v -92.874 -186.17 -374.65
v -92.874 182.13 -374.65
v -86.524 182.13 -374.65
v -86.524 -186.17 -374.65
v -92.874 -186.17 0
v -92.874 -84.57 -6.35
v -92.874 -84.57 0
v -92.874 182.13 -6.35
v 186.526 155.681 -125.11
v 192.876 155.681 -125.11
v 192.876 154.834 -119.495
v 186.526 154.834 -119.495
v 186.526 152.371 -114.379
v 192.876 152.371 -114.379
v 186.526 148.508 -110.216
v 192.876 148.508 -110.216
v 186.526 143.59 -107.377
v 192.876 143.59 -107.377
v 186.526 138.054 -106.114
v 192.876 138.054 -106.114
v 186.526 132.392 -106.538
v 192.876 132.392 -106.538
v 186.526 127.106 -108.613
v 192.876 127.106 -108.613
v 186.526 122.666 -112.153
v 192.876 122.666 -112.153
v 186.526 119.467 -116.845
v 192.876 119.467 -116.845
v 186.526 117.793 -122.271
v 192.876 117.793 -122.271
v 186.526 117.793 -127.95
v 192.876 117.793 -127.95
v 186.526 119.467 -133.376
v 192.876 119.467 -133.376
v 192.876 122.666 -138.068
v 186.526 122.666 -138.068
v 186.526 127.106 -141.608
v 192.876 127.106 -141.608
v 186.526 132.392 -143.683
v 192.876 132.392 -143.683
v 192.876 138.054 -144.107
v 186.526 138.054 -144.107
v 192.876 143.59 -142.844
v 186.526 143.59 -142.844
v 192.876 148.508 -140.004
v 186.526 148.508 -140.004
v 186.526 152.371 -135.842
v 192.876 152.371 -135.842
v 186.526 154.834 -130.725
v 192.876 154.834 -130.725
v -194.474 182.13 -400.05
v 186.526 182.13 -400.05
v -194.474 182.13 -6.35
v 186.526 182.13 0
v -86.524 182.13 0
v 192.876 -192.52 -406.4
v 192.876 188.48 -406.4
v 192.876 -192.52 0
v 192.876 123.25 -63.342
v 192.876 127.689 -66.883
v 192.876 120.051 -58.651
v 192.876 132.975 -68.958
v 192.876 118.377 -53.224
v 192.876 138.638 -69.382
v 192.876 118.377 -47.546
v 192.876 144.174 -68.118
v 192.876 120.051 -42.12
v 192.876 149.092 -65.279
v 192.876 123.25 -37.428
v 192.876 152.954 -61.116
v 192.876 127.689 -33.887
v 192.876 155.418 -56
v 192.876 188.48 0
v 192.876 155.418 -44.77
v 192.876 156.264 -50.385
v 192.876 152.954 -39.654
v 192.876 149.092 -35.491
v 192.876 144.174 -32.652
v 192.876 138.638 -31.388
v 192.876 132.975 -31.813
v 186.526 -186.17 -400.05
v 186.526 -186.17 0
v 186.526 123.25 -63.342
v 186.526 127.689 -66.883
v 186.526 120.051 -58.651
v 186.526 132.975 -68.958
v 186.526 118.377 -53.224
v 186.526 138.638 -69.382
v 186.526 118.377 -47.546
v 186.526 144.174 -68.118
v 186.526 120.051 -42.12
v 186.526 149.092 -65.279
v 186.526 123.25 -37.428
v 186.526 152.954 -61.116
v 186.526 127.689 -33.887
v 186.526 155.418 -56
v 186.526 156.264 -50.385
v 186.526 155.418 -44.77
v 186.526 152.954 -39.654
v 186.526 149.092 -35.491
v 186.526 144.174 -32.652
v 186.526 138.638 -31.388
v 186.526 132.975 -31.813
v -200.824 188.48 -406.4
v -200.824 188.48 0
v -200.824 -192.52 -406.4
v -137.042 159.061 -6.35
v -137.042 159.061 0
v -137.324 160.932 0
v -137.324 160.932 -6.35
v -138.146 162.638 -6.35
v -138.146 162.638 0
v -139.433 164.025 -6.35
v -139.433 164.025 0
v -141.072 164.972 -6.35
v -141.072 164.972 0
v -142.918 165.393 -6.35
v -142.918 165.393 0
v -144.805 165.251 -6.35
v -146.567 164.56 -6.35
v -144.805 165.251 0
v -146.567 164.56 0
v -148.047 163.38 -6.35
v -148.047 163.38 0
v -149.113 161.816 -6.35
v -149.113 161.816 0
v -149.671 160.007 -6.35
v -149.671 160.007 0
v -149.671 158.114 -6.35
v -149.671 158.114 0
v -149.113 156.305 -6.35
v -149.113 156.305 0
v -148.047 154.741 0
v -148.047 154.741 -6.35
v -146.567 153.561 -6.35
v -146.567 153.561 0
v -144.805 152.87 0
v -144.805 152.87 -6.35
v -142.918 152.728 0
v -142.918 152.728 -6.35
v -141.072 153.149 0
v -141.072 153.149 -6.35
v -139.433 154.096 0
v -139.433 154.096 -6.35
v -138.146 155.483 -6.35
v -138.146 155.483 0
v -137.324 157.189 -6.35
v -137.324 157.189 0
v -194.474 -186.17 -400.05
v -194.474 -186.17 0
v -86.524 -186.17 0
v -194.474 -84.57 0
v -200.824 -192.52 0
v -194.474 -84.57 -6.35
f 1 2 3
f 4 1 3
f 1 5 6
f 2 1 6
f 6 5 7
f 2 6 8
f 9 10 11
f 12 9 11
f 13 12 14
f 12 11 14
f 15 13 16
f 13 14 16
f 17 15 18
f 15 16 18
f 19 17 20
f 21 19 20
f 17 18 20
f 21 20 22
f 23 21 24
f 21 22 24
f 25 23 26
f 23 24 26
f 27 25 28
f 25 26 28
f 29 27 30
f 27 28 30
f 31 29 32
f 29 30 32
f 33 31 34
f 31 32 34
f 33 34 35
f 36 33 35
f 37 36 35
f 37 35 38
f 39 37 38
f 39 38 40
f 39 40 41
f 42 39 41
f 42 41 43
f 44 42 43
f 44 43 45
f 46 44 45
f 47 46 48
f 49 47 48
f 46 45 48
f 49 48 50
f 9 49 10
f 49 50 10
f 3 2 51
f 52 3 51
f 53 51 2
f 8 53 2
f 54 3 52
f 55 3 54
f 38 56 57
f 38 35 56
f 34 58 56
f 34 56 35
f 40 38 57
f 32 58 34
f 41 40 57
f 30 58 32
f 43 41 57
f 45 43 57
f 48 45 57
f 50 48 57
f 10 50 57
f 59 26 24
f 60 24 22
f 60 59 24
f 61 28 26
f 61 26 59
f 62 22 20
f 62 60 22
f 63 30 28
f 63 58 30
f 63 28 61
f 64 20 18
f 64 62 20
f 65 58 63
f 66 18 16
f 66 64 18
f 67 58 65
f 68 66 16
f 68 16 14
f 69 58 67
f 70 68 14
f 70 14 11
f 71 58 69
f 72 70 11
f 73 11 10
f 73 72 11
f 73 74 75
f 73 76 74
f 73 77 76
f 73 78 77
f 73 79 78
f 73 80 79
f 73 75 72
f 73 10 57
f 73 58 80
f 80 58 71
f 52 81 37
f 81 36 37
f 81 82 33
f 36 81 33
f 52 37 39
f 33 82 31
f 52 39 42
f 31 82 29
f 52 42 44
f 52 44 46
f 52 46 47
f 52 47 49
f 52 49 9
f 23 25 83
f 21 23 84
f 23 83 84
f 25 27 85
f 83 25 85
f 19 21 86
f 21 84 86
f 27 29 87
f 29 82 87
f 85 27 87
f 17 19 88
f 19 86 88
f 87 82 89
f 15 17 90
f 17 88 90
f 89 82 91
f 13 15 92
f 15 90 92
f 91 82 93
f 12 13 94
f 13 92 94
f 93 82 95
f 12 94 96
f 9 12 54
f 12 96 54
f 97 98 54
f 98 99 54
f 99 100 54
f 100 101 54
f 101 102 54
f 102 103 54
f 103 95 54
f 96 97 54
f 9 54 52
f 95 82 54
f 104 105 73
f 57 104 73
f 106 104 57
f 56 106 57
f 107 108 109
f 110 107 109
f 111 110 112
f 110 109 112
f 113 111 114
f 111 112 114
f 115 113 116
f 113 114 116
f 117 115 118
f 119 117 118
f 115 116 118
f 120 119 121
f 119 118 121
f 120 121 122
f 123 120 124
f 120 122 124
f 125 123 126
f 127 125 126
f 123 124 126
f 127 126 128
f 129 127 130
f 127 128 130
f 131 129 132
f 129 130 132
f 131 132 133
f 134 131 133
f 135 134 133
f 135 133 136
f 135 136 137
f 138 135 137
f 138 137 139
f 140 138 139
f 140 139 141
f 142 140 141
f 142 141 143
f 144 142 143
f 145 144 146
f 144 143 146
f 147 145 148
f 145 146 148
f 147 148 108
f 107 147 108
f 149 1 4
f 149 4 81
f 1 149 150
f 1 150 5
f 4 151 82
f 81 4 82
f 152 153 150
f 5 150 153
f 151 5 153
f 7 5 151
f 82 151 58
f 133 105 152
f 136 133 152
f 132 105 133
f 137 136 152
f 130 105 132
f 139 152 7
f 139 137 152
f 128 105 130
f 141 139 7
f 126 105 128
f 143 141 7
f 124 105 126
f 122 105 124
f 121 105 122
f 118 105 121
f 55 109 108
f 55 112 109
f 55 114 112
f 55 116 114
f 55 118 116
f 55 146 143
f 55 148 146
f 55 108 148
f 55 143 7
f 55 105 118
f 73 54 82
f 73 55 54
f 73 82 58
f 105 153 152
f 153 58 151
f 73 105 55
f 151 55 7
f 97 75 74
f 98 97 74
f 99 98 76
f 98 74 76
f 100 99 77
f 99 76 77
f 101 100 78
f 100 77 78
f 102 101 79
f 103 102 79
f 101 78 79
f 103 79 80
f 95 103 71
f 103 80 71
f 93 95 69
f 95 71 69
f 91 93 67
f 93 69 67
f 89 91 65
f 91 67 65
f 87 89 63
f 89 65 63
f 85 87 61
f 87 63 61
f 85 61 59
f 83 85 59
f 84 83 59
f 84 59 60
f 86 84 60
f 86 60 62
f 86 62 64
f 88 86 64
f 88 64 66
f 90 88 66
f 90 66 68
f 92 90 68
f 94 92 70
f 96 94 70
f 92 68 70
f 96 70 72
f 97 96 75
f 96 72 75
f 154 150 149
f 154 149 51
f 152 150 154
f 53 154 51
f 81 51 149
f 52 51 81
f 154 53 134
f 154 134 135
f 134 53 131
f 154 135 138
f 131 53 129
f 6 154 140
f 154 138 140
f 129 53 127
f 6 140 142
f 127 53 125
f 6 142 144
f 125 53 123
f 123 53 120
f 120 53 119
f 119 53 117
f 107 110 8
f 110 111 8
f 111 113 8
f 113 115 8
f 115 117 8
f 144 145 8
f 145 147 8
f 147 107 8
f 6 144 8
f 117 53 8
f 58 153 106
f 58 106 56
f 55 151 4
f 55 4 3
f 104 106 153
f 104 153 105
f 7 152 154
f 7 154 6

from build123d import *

# Parameters (mm, degrees)
F0_W      = 393.7
F0_H      = 381
F1_DEPTH  = 406.4
F2_W      = 381
F2_H      = 368.3
F3_DEPTH  = 400.05
F4_W      = 6.35
F4_H      = 368.3
F5_DEPTH  = 374.65
F6_W      = 101.6
F6_H      = 266.7
F7_DEPTH  = 6.35
F8_R      = 6.35
F9_DEPTH  = 6.35
F10_R     = 19.05
F11_DEPTH = 6.35
F12_R     = 19.05
F13_DEPTH = 6.35


with BuildPart() as f1:
    # F0 (on Top) → F1 (new body)
    with BuildSketch(Plane.XY):
        with Locations((-3.9738783777, -2.0195368604)):
            Rectangle(F0_W, F0_H)
    extrude(amount=-F1_DEPTH)

    # F2 (on face) → F3 (cut)
    with BuildSketch(Plane.XY):
        with Locations((-3.9738783777, -2.0195368604)):
            Rectangle(F2_W, F2_H)
    extrude(amount=-F3_DEPTH, mode=Mode.SUBTRACT)

    # F4 (on face) → F5 (join)
    with BuildSketch(Plane.XY):
        with Locations((-89.6988783777, -2.0195368604)):
            Rectangle(F4_W, F4_H)
    extrude(amount=-F5_DEPTH)

    # F6 (on face) → F7 (join)
    with BuildSketch(Plane.XY):
        with Locations((-143.6738783777, 48.7804631396)):
            Rectangle(F6_W, F6_H)
    extrude(amount=-F7_DEPTH)

    # F8 (on face) → F9 (cut)
    with BuildSketch(Plane.XY):
        with Locations((-143.3922201395, 159.0605080128)):
            Circle(F8_R)
    extrude(amount=-F9_DEPTH, mode=Mode.SUBTRACT)

    # F10 (on face) → F11 (cut)
    with BuildSketch(Plane.YZ.offset(192.8761216223)):
        with Locations((136.6306692362, -125.1103579998)):
            Circle(F10_R)
    extrude(amount=-F11_DEPTH, mode=Mode.SUBTRACT)

    # F12 (on face) → F13 (cut)
    with BuildSketch(Plane.YZ.offset(192.8761216223)):
        with Locations((137.2144669294, -50.3851957619)):
            Circle(F12_R)
    extrude(amount=-F13_DEPTH, mode=Mode.SUBTRACT)


solid = f1.part
